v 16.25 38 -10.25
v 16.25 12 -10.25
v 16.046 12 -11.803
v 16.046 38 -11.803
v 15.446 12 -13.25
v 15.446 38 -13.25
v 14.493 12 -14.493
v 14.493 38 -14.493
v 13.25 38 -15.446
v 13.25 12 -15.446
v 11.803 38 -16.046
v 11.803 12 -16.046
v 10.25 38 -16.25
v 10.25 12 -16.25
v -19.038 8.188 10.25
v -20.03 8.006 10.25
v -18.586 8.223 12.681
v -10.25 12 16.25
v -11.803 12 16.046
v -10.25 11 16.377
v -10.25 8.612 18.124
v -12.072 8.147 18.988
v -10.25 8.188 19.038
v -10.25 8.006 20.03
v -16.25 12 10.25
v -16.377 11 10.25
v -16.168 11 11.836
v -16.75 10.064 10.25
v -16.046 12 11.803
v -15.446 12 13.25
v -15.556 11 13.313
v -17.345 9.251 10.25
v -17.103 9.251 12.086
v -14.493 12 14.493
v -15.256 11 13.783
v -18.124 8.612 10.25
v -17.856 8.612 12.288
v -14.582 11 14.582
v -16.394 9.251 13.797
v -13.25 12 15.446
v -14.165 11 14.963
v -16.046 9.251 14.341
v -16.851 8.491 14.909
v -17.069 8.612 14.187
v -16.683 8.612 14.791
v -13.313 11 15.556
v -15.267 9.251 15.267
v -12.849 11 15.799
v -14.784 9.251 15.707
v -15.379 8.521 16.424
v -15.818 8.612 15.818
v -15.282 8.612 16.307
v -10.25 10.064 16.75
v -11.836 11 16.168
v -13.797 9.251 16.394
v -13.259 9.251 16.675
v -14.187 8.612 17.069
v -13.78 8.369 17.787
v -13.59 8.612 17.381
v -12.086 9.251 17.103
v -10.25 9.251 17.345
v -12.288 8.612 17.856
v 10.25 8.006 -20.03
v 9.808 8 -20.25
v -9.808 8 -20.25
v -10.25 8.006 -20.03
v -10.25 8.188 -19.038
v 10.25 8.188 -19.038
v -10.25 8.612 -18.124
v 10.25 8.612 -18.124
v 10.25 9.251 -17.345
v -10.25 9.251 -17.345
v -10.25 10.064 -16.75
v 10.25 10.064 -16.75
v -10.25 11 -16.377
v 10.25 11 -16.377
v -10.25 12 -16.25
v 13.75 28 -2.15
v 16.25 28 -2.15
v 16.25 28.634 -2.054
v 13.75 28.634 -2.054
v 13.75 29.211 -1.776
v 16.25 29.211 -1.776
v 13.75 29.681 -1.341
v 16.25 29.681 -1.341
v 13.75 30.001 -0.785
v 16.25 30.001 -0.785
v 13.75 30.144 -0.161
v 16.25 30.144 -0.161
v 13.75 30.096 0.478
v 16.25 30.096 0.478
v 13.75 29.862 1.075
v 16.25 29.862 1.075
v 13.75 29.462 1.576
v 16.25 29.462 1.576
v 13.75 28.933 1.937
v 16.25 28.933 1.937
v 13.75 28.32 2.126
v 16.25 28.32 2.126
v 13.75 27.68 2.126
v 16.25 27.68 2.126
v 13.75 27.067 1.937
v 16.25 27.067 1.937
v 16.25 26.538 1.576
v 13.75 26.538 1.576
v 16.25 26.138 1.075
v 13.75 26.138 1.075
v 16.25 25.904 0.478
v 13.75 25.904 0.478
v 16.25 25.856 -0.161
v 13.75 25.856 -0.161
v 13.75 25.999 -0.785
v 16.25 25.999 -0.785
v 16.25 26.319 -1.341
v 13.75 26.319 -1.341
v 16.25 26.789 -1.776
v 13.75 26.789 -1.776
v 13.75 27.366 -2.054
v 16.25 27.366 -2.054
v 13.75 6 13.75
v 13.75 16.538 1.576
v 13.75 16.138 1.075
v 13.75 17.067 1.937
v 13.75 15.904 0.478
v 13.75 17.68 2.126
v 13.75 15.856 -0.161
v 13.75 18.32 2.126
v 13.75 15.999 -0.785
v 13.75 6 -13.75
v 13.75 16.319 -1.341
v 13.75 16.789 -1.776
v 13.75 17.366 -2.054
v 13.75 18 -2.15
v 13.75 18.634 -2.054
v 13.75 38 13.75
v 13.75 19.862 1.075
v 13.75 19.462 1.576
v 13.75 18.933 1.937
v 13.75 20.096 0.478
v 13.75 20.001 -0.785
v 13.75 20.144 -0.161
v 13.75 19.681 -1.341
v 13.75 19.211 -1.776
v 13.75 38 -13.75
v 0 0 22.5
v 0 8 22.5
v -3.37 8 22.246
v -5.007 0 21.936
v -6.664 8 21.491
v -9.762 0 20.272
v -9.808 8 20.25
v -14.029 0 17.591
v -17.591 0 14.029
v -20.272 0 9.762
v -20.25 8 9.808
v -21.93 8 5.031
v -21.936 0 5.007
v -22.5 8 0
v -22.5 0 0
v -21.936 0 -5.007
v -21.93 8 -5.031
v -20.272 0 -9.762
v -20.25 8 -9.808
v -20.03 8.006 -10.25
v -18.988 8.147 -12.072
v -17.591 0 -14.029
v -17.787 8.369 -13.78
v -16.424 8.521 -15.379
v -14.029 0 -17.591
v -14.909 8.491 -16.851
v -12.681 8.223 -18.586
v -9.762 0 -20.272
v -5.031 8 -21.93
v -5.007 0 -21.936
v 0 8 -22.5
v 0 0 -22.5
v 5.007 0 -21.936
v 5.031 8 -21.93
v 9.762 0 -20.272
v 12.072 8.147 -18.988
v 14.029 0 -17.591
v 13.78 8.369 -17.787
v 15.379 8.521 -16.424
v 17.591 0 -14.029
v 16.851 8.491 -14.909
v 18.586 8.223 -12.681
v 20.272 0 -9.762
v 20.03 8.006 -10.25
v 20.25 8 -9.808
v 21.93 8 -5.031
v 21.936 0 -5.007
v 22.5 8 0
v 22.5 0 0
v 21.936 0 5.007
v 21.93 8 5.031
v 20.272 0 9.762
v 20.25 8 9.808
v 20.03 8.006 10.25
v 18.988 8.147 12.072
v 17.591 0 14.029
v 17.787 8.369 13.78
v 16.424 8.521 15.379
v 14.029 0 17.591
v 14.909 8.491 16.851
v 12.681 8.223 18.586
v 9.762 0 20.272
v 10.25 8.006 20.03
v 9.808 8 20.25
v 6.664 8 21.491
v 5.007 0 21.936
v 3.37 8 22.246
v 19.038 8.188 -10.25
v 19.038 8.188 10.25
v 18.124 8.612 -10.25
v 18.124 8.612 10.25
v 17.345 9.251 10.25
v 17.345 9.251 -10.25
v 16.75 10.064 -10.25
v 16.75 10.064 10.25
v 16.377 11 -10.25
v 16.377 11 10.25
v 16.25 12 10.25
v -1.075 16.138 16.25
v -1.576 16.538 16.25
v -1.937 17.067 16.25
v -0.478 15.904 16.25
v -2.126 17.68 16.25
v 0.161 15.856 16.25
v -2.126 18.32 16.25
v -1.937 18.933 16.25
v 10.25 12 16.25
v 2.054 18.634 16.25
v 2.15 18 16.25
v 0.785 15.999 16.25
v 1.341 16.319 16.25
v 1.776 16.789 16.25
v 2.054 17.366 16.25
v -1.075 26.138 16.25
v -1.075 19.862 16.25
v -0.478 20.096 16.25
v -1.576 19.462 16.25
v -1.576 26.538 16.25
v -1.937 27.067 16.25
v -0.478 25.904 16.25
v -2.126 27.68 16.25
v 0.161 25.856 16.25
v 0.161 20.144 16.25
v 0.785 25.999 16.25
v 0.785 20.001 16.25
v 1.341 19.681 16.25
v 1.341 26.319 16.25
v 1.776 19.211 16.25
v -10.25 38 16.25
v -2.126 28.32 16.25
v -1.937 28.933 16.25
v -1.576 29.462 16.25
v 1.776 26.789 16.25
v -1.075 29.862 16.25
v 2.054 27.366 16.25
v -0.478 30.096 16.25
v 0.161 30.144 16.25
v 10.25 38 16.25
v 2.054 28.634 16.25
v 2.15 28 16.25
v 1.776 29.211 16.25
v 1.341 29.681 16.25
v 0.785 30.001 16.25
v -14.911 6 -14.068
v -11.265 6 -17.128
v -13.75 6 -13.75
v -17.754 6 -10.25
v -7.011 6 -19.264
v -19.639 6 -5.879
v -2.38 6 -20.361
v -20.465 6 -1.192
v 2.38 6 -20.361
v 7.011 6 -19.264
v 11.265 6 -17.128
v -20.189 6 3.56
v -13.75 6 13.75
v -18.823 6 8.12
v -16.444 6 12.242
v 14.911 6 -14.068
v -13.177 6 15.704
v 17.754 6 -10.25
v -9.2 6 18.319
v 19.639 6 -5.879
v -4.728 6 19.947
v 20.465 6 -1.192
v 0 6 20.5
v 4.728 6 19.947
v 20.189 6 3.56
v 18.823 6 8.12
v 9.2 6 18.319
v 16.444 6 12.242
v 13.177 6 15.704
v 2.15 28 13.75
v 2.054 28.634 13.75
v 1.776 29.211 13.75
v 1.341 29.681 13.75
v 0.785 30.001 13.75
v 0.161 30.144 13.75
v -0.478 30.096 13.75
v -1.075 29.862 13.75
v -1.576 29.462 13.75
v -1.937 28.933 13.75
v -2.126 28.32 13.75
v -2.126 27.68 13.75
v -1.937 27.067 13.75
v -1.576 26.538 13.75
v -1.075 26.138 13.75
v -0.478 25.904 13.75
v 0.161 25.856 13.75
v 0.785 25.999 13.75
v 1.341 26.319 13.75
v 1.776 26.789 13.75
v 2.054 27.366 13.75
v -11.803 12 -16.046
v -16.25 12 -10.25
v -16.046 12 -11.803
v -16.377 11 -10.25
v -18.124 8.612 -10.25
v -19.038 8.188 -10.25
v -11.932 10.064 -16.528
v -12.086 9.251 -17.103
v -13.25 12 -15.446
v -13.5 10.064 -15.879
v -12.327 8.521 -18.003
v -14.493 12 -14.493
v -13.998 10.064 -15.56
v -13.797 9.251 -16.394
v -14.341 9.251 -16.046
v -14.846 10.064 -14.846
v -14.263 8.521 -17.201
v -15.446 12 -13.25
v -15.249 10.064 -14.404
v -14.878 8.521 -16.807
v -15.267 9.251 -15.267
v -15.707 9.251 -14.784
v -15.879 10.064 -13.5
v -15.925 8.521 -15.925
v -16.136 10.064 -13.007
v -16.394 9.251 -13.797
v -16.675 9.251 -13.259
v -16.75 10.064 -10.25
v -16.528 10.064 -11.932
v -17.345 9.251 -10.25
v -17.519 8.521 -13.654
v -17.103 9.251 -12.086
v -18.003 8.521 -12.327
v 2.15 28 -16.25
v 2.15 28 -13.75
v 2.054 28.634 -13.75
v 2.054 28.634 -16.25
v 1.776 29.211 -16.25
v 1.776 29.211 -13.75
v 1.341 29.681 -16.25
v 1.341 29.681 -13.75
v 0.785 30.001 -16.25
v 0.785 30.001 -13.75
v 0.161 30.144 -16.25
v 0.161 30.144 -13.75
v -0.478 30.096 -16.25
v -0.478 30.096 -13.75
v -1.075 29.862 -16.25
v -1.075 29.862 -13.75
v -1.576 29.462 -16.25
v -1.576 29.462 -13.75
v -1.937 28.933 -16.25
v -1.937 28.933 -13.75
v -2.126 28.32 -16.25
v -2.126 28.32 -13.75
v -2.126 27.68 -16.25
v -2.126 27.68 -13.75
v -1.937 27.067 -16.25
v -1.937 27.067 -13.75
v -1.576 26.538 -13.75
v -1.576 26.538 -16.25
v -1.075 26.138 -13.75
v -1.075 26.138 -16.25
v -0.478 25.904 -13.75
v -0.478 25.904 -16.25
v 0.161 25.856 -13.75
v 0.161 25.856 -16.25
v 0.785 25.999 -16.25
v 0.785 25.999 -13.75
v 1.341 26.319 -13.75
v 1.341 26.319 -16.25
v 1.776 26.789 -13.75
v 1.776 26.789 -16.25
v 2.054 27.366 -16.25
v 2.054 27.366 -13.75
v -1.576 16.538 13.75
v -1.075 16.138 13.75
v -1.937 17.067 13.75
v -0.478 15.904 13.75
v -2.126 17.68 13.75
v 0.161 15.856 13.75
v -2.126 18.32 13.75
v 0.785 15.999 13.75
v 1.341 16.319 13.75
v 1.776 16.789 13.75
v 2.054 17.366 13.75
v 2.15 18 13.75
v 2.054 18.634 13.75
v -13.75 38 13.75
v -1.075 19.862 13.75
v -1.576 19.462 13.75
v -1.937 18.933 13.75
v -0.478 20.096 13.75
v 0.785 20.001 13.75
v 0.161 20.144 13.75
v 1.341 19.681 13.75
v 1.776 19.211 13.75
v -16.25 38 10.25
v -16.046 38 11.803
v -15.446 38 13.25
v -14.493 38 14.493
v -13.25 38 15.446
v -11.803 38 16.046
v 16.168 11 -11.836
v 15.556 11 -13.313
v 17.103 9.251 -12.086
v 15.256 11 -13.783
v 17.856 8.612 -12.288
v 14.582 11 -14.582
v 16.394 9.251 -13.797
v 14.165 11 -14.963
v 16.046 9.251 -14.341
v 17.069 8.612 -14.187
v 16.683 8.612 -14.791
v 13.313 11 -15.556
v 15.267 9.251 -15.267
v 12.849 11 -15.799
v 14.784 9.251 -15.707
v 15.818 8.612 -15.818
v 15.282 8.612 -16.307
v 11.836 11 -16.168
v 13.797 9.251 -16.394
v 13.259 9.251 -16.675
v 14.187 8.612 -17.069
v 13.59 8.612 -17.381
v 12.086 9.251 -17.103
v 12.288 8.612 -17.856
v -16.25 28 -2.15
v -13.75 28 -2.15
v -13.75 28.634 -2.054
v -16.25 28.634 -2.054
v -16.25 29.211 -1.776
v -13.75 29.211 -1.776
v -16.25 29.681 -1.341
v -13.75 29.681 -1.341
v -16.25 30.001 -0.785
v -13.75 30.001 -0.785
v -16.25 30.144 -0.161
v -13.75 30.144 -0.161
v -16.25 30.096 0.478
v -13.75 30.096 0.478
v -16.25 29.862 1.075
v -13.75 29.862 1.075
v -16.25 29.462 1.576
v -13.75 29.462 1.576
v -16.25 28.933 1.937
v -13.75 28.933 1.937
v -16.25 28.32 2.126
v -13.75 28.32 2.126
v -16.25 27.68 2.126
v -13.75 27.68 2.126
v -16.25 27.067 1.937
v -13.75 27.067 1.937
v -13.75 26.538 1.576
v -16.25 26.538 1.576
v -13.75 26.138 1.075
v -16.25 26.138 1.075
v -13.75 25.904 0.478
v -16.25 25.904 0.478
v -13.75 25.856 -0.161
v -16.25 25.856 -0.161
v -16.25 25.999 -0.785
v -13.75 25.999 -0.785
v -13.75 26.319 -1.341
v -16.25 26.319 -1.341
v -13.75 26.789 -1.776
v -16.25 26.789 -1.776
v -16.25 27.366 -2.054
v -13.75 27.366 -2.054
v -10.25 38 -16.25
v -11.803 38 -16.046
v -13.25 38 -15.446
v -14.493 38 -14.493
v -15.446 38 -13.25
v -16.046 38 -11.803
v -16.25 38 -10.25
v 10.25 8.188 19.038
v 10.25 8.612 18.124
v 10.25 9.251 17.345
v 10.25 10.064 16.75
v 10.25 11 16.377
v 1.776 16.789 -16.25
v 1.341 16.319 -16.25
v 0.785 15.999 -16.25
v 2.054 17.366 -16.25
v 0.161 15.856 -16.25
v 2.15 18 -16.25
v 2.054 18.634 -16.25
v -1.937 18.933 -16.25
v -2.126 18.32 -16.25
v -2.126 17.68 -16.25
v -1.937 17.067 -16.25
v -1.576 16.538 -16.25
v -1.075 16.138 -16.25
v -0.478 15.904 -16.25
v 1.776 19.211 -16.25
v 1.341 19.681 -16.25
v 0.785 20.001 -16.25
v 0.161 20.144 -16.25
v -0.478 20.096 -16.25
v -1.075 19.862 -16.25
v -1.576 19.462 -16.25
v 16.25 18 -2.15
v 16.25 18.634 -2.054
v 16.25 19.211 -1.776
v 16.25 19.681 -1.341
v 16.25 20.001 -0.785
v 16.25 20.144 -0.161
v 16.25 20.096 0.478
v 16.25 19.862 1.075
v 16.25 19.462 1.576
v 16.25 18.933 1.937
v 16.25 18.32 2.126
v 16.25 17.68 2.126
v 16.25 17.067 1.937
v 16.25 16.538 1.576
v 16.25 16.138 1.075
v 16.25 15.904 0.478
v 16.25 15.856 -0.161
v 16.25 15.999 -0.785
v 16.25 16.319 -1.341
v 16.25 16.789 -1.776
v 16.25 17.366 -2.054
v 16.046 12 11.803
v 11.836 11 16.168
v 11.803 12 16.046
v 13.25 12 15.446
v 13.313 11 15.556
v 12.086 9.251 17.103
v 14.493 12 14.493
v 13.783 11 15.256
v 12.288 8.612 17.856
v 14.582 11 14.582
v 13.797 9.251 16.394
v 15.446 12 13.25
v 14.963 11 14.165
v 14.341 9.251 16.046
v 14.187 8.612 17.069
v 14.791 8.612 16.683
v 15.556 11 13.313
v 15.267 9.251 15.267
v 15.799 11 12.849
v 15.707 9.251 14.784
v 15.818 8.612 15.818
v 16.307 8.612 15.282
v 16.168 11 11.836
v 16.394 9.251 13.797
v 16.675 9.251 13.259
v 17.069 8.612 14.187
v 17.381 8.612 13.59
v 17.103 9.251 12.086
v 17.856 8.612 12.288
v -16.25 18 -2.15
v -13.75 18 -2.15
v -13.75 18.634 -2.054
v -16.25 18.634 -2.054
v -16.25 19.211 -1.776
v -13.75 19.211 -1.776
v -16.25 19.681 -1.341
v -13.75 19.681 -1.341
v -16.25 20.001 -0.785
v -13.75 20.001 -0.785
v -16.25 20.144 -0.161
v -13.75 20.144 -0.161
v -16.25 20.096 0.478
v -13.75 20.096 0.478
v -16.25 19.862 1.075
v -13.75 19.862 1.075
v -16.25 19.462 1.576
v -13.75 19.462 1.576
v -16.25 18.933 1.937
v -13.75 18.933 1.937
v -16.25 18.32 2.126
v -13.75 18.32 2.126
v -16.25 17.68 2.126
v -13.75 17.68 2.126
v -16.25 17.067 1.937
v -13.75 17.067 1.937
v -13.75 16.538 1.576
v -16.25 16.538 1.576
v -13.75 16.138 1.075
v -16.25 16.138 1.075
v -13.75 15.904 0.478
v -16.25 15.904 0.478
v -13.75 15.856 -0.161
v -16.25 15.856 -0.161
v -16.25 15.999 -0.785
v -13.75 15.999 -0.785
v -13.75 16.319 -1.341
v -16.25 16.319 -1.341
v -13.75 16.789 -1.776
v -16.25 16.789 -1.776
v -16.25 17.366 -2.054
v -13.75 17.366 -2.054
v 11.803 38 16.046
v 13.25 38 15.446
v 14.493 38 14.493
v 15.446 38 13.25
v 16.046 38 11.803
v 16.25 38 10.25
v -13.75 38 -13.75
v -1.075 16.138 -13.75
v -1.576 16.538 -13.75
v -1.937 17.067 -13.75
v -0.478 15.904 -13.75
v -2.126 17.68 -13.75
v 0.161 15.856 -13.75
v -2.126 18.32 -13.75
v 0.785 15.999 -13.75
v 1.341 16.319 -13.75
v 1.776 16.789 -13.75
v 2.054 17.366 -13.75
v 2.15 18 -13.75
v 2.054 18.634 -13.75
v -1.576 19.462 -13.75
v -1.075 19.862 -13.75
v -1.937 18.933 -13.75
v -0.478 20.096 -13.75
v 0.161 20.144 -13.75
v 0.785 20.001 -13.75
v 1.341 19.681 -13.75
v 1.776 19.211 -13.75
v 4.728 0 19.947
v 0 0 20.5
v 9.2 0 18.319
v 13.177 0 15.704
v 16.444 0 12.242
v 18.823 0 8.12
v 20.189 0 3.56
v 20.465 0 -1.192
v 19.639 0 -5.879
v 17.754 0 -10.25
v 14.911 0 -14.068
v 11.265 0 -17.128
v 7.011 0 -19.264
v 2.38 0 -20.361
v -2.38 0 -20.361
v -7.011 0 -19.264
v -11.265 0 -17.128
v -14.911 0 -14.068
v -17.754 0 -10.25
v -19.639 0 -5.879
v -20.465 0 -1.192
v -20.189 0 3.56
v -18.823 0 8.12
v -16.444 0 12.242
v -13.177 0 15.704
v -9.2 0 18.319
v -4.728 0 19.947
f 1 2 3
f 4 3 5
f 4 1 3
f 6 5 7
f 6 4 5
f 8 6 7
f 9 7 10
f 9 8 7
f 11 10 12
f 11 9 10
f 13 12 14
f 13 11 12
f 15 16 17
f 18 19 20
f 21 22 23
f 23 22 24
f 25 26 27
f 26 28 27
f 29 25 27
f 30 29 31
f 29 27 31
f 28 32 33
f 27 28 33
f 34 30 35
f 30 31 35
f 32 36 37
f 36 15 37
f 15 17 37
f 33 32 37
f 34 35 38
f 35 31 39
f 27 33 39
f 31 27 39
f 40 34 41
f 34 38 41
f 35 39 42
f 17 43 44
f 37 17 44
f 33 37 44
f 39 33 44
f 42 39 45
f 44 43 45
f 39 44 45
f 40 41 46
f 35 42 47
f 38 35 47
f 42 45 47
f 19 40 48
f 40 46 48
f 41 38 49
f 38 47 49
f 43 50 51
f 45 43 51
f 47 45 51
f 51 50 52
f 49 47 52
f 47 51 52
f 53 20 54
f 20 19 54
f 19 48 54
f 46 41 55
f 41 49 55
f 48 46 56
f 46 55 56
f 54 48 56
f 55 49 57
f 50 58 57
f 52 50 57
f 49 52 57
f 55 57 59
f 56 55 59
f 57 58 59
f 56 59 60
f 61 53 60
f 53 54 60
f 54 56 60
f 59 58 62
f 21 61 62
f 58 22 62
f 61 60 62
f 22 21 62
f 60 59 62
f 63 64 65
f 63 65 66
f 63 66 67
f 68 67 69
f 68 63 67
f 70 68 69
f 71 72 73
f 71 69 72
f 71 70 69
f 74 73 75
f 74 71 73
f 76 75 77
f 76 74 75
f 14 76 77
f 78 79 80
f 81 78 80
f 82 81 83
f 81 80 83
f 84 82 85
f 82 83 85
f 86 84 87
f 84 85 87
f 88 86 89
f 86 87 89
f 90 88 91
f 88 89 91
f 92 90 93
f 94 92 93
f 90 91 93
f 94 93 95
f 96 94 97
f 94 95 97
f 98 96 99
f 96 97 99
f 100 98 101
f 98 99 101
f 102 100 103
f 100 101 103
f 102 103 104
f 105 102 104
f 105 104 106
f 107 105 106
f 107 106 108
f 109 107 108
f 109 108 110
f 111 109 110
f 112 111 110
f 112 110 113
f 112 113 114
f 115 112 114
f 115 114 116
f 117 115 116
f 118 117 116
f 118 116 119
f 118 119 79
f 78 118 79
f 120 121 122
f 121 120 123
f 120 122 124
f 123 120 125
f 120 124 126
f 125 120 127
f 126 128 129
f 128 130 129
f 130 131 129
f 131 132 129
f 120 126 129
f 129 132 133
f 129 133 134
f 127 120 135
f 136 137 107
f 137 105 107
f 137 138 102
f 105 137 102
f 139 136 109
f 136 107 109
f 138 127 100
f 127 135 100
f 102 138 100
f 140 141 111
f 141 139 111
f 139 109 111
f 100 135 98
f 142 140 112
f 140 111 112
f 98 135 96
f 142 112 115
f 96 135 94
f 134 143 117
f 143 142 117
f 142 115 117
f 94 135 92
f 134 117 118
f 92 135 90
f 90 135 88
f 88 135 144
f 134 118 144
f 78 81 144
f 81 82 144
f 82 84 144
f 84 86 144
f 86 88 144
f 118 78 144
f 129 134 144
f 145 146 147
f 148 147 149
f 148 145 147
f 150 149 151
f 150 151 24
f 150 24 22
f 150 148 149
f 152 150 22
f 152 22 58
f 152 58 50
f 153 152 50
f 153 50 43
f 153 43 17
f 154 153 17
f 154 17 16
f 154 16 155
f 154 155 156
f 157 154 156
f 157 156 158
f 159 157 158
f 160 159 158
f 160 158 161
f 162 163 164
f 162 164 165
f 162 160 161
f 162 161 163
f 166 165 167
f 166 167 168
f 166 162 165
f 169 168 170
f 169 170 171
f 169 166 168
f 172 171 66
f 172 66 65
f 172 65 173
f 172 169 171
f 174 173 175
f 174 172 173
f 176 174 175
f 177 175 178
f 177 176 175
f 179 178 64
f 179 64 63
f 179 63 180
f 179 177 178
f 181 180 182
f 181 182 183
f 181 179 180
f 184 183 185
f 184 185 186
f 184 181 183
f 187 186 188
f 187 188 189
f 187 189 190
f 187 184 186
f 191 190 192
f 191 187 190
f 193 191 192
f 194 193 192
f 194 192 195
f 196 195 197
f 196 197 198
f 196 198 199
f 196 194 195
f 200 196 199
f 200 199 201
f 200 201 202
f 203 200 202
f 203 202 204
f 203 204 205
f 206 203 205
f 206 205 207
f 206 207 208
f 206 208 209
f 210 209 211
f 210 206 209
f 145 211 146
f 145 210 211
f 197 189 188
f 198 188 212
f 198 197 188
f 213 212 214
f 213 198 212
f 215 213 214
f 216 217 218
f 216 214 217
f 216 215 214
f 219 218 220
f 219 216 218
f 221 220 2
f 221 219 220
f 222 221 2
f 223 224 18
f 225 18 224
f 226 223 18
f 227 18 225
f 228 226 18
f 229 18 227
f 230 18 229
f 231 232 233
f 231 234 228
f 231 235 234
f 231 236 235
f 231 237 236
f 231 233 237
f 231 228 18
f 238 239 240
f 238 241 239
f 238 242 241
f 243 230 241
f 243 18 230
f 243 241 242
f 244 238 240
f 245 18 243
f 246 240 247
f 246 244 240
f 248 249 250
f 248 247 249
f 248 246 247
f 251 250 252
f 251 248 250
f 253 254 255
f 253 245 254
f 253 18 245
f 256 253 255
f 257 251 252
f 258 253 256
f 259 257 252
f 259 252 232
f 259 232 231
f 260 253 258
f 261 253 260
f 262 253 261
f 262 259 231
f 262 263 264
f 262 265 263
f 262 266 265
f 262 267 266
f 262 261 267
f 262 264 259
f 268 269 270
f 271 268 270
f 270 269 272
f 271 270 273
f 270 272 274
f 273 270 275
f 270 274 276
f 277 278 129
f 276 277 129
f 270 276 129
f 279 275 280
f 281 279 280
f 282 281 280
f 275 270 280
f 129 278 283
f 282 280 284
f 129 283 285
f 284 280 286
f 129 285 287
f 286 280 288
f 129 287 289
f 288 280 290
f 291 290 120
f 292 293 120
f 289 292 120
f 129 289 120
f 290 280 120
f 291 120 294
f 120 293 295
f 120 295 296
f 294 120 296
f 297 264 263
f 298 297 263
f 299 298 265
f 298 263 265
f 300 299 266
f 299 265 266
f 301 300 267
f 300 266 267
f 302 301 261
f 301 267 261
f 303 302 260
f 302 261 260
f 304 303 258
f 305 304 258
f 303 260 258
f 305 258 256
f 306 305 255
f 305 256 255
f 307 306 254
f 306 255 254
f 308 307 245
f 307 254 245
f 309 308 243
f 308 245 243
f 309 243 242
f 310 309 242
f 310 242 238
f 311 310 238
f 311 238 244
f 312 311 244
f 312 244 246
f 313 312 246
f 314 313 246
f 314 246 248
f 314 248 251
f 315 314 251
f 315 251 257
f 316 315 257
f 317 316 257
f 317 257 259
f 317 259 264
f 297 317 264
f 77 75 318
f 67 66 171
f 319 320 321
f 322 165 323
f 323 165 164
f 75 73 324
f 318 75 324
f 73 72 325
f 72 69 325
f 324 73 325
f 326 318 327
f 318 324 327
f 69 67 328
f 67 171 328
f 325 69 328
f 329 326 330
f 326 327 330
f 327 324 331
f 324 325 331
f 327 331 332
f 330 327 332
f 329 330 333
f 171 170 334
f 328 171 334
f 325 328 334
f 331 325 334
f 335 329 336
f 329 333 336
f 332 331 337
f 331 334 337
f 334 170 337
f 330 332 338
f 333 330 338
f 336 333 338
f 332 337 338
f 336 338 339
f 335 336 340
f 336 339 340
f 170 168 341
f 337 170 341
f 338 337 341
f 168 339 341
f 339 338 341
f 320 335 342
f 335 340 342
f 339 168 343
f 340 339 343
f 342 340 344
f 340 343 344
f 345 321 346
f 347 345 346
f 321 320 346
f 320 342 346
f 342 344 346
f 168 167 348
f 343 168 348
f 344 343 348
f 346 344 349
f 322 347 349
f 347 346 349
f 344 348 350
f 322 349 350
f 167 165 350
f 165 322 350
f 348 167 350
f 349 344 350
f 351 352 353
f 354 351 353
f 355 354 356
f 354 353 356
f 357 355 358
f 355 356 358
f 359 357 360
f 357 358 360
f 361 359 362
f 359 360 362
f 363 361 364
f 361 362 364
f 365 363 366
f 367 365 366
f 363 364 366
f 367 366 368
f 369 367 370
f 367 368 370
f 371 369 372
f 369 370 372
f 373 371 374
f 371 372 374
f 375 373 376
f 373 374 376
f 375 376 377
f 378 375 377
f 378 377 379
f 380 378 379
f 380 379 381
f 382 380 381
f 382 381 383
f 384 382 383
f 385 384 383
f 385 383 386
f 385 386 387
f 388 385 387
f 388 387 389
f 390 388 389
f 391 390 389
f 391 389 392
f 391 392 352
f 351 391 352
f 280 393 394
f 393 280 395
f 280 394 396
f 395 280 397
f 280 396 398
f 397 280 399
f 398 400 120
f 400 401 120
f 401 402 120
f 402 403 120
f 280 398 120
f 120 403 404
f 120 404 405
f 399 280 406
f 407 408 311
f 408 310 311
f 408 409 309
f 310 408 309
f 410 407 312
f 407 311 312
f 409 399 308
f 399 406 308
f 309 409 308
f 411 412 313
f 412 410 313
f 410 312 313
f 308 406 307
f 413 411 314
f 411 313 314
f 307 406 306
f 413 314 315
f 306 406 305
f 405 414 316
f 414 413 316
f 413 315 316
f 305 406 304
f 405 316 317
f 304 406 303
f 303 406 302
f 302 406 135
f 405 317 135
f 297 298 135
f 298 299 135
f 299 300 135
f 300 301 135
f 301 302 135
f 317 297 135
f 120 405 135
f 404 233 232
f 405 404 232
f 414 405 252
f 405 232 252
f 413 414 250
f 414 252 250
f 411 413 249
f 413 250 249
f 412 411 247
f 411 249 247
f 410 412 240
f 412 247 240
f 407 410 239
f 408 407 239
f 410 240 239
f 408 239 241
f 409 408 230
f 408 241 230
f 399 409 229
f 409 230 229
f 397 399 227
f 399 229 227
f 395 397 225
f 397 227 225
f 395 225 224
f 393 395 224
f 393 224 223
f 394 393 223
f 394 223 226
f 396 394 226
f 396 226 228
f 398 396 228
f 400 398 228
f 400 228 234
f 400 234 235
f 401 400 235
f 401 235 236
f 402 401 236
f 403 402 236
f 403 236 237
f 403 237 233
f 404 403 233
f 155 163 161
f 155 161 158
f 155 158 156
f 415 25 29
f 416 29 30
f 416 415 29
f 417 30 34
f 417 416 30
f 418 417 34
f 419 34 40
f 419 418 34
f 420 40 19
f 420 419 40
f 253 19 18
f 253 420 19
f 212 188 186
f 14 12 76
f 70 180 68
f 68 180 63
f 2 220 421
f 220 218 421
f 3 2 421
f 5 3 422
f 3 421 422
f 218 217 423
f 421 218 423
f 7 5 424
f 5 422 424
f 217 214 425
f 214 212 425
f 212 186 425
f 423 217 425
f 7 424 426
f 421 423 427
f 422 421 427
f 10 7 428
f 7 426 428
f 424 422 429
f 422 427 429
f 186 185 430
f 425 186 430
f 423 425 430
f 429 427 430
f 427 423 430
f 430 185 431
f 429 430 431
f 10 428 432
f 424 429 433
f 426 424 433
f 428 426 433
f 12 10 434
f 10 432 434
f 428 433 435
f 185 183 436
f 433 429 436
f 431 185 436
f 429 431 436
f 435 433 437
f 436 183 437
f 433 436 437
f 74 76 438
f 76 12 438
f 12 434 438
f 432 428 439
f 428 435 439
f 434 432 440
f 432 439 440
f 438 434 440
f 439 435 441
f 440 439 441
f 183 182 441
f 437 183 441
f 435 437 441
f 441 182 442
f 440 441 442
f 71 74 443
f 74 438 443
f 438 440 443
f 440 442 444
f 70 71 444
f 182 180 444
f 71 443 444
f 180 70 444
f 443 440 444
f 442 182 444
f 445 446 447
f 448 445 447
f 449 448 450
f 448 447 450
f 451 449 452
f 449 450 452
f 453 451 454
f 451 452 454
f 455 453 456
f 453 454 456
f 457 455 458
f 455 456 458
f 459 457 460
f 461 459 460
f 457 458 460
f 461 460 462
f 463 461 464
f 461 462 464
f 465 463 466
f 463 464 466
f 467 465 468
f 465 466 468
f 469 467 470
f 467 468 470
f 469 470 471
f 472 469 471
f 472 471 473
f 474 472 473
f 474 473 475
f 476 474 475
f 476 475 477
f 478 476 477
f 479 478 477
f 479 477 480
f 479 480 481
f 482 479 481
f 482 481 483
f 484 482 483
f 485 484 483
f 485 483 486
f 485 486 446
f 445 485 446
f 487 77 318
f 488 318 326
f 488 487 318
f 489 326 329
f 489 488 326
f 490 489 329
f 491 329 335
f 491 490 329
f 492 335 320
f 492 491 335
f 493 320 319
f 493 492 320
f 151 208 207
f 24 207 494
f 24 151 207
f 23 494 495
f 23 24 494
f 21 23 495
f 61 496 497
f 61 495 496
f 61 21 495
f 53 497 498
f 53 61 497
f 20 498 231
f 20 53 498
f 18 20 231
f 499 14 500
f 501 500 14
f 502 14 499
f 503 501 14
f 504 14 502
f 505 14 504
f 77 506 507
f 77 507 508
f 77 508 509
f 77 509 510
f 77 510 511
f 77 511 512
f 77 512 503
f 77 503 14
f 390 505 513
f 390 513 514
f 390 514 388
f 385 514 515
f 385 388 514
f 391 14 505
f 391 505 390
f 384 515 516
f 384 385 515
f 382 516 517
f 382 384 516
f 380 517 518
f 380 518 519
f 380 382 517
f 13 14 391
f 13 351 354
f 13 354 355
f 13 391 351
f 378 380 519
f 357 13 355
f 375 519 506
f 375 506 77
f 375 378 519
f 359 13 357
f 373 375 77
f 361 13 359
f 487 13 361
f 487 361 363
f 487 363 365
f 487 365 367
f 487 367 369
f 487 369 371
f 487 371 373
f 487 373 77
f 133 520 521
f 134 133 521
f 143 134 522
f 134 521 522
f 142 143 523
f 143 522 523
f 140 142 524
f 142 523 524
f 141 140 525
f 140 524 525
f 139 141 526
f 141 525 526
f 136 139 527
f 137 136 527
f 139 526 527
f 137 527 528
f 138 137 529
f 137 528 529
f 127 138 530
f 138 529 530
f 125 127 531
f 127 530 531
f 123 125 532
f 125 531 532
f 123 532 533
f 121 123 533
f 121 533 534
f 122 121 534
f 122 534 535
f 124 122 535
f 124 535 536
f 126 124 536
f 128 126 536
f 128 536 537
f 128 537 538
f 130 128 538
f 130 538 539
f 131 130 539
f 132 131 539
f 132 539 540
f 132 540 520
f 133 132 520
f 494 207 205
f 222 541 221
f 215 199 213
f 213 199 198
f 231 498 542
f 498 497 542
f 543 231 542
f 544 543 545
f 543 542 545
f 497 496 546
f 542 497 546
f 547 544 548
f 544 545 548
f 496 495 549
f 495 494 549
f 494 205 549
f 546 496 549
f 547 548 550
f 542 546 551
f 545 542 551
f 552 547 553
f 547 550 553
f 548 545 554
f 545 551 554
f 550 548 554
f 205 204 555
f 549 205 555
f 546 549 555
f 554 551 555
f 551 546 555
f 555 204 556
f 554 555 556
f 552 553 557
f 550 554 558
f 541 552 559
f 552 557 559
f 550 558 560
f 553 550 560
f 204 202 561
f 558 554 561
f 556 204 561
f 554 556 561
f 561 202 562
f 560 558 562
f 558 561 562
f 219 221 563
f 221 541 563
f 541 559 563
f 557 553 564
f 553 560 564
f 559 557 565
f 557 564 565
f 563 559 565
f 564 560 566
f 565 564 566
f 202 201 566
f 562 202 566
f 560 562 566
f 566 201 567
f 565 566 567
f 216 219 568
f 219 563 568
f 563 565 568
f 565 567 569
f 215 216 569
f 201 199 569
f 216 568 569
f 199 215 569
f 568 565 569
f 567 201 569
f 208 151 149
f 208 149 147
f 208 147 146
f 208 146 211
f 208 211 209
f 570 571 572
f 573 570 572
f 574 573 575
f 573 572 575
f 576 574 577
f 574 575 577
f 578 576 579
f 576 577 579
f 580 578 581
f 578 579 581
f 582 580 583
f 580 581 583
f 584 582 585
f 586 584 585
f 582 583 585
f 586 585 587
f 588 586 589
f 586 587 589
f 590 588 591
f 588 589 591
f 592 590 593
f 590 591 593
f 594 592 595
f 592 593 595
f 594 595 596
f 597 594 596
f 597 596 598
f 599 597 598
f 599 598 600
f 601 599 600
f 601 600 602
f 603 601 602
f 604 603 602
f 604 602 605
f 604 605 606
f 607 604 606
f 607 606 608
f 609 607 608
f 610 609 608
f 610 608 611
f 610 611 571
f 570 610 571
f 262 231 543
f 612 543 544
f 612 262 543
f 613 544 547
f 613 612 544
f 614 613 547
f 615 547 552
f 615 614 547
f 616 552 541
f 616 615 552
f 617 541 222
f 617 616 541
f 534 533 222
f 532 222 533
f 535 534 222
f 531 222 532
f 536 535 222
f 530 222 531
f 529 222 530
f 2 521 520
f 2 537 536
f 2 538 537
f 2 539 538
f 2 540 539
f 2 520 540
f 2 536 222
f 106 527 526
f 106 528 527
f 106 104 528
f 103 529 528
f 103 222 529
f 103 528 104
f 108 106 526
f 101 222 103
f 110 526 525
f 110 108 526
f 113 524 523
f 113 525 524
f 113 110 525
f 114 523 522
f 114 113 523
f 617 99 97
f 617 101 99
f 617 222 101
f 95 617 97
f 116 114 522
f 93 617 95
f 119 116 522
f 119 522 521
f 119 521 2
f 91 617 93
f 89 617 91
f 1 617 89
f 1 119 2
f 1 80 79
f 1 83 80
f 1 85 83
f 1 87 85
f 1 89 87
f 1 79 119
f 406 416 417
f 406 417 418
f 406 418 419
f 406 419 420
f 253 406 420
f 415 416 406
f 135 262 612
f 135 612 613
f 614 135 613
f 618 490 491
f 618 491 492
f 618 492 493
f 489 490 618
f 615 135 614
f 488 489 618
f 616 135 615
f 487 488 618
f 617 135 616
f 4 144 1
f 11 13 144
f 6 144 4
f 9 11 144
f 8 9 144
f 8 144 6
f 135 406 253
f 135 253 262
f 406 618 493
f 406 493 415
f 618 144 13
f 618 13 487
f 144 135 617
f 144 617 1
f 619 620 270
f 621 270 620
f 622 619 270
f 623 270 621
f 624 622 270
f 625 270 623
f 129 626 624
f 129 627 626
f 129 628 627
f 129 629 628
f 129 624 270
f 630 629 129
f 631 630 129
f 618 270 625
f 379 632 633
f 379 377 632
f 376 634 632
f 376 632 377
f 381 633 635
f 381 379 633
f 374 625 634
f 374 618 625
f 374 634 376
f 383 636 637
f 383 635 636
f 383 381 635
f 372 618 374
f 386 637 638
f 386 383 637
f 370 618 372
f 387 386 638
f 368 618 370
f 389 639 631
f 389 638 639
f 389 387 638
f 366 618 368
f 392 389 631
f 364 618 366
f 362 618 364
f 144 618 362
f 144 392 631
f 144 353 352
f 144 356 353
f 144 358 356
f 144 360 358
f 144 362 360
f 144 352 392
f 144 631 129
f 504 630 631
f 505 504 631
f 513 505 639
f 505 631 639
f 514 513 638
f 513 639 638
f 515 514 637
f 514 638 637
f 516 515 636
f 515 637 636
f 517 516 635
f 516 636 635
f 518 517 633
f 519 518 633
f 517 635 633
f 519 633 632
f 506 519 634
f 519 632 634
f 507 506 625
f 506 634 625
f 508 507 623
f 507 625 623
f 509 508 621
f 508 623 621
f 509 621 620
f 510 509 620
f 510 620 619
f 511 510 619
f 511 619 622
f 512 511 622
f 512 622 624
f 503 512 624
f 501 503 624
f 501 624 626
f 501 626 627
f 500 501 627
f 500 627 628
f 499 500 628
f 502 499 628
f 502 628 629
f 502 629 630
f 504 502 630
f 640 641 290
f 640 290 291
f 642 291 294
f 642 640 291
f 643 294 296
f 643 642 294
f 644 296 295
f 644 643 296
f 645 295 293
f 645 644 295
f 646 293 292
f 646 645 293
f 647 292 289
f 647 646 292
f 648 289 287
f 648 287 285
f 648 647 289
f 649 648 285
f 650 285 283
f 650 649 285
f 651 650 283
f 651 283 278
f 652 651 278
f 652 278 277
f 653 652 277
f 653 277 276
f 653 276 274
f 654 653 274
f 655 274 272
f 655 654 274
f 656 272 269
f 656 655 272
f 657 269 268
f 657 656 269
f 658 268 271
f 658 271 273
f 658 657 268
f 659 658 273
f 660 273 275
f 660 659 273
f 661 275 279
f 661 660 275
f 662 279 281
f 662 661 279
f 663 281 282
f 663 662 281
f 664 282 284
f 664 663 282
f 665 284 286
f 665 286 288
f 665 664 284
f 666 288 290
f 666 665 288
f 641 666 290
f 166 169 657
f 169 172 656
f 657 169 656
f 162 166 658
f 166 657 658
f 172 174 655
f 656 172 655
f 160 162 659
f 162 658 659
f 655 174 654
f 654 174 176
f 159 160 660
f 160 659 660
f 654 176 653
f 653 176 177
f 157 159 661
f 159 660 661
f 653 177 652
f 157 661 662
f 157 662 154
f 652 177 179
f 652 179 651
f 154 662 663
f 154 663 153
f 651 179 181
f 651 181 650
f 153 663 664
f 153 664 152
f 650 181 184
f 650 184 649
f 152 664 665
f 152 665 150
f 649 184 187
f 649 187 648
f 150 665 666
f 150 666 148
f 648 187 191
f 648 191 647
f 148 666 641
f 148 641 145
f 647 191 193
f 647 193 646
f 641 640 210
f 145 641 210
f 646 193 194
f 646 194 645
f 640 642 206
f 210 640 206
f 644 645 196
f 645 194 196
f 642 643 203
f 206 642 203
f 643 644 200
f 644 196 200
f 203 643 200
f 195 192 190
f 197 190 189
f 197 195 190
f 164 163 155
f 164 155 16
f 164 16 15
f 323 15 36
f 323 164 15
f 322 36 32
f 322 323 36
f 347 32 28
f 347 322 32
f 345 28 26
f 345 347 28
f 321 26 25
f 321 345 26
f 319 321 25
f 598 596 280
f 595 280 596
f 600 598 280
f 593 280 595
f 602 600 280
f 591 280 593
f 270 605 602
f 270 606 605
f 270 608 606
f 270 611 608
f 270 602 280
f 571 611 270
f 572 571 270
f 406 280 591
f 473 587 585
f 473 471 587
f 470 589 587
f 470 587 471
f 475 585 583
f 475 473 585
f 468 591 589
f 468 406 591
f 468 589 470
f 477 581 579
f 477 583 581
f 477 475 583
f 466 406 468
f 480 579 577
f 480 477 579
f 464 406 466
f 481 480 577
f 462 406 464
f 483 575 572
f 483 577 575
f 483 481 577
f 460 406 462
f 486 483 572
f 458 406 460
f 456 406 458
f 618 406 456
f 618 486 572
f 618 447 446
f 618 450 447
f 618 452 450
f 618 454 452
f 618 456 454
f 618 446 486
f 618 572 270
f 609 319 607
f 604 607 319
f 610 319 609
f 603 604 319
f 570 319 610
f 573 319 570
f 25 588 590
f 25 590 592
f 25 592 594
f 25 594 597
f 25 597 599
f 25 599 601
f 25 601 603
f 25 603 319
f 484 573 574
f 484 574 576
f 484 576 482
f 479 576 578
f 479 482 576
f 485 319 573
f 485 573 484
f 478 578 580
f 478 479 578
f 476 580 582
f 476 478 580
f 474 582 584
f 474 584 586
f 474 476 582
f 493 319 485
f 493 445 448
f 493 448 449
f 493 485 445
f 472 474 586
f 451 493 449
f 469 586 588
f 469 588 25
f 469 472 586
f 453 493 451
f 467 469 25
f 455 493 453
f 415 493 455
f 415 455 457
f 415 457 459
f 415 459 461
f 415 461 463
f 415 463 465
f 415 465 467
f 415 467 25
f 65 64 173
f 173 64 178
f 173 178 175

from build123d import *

# Parameters (mm, degrees)
SKETCH_1_R          = 22.5
SKETCH_1_R_2        = 20.5
EXTRUDE_1_DEPTH     = 6
SKETCH_2_R          = 22.5
EXTRUDE_2_DEPTH     = 2
SKETCH_3_W          = 26.5
SKETCH_3_H          = 26.5
SKETCH_3_W_2        = 20.5
SKETCH_3_H_2        = 20.5
EXTRUDE_3_DEPTH     = 30
SKETCH_4_R          = 2.15
CUT_EXTRUDE_1_DEPTH = 30
SKETCH_5_R          = 2.15
CUT_EXTRUDE_2_DEPTH = 30
FILLET_1_R          = 3
SKETCH_7_W          = 26.5
SKETCH_7_H          = 26.5
EXTRUDE_4_DEPTH     = 30
SKETCH_8_W          = 27.5
SKETCH_8_H          = 27.5
CUT_EXTRUDE_4_DEPTH = 50.563091106
FILLET_2_R          = 4
SKETCH_9_R          = 2.15
CUT_EXTRUDE_5_DEPTH = 59.752127725
SKETCH_10_R         = 2.15
CUT_EXTRUDE_6_DEPTH = 59.752127725


with BuildPart() as part:
    # 草图1 → 凸台-拉伸1 (new body)
    with BuildSketch(Plane(origin=(0, 0, 0), x_dir=(1, 0, 0), z_dir=(0, 1, 0))):
        with Locations(Location((0, 0, 0), (0, 0, 270))):
            Circle(SKETCH_1_R)
        with Locations(Location((0, 0, 0), (0, 0, 270))):
            Circle(SKETCH_1_R_2, mode=Mode.SUBTRACT)
    extrude(amount=EXTRUDE_1_DEPTH)

    # 草图2 → 凸台-拉伸2 (add)
    with BuildSketch(Plane(origin=(0, 6, 0), x_dir=(1, 0, 0), z_dir=(0, 1, 0))):
        with Locations(Location((0, 0, 0), (0, 0, 270))):
            Circle(SKETCH_2_R)
    extrude(amount=EXTRUDE_2_DEPTH)

    # 草图3 → 凸台-拉伸3 (add)
    with BuildSketch(Plane(origin=(0, 8, 0), x_dir=(1, 0, 0), z_dir=(0, 1, 0))):
        Rectangle(SKETCH_3_W, SKETCH_3_H)
        Rectangle(SKETCH_3_W_2, SKETCH_3_H_2, mode=Mode.SUBTRACT)
    extrude(amount=EXTRUDE_3_DEPTH)

    # 草图4 → 切除-拉伸1 (cut)
    with BuildSketch(Plane.XY.offset(13.25)):
        with Locations((0, 28)):
            Circle(SKETCH_4_R)
        with Locations((0, 18)):
            Circle(SKETCH_4_R)
    extrude(amount=-CUT_EXTRUDE_1_DEPTH, mode=Mode.SUBTRACT)

    # 草图5 → 切除-拉伸2 (cut)
    with BuildSketch(Plane(origin=(13.25, 0, 0), x_dir=(0, 0, -1), z_dir=(1, 0, 0))):
        with Locations((0, 28)):
            Circle(SKETCH_5_R)
        with Locations((0, 18)):
            Circle(SKETCH_5_R)
    extrude(amount=-CUT_EXTRUDE_2_DEPTH, mode=Mode.SUBTRACT)

    # 圆角1
    fillet_1_edges = [part.edges().sort_by_distance(p)[0] for p in [
        (-13.25, 23, -13.25),
        (-13.25, 23, 13.25),
        (13.25, 23, 13.25),
        (13.25, 23, -13.25),
    ]]
    fillet(fillet_1_edges, radius=FILLET_1_R)

    # 草图7 → 凸台-拉伸4 (add)
    with BuildSketch(Plane(origin=(0, 38, 0), x_dir=(1, 0, 0), z_dir=(0, 1, 0))):
        with BuildLine():
            Line((-16.25, 10.25), (-16.25, -10.25))
            ThreePointArc((-16.25, -10.25), (-14.492640687, -14.492640687), (-10.25, -16.25))
            Line((-10.25, -16.25), (10.25, -16.25))
            ThreePointArc((10.25, -16.25), (14.492640687, -14.492640687), (16.25, -10.25))
            Line((16.25, -10.25), (16.25, 10.25))
            ThreePointArc((16.25, 10.25), (14.492640687, 14.492640687), (10.25, 16.25))
            Line((10.25, 16.25), (-10.25, 16.25))
            ThreePointArc((-10.25, 16.25), (-14.492640687, 14.492640687), (-16.25, 10.25))
        make_face()
        Rectangle(SKETCH_7_W, SKETCH_7_H, mode=Mode.SUBTRACT)
    extrude(amount=-EXTRUDE_4_DEPTH)

    # 草图8 → 切除-拉伸4 (cut, through all)
    with BuildSketch(Plane(origin=(0, 38, 0), x_dir=(1, 0, 0), z_dir=(0, 1, 0))):
        Rectangle(SKETCH_8_W, SKETCH_8_H)
    extrude(amount=-CUT_EXTRUDE_4_DEPTH, mode=Mode.SUBTRACT)

    # 圆角2
    # the kernel refuses this fillet: 4 mm, written as the material it adds along each edge
    with BuildSketch(Plane(origin=(-10.25, 8, -10.25), x_dir=(0, 0, -1), z_dir=(1, 0, 0))) as fillet_2_piece_1_section:
        with BuildLine():
            CenterArc((6 + FILLET_2_R, FILLET_2_R), FILLET_2_R, 180, 90)
            Line((6, FILLET_2_R), (6, 0))
            Line((6, 0), (6 + FILLET_2_R, 0))
        make_face()
    fillet_2_piece_1 = revolve(axis=Axis((-10.25, 8, -10.25), (0, 1, 0)), revolution_arc=90, mode=Mode.PRIVATE)
    fillet_2_piece_1 = fillet_2_piece_1 & Plane(origin=(0, 8.919609383, 0), x_dir=(0, 0, 1), z_dir=(0, -1, 0)) * Cylinder(22.5, 40, mode=Mode.PRIVATE)
    add(fillet_2_piece_1)
    with BuildSketch(Plane(origin=(10.25, 8, -16.25), x_dir=(0, 0, -1), z_dir=(-1, 0, 0))) as fillet_2_piece_2_section:
        with BuildLine():
            CenterArc((FILLET_2_R, -FILLET_2_R), FILLET_2_R, 90, 90)
            Line((0, -FILLET_2_R), (0, 0))
            Line((0, 0), (FILLET_2_R, 0))
        make_face()
    fillet_2_piece_2 = extrude(amount=20.5, mode=Mode.PRIVATE)
    fillet_2_piece_2 = fillet_2_piece_2 & Plane(origin=(0, 8.90566888, 0), x_dir=(0, 0, 1), z_dir=(0, -1, 0)) * Cylinder(22.5, 57, mode=Mode.PRIVATE)
    add(fillet_2_piece_2)
    with BuildSketch(Plane(origin=(10.25, 8, -10.25), x_dir=(1, 0, 0), z_dir=(0, 0, 1))) as fillet_2_piece_3_section:
        with BuildLine():
            CenterArc((6 + FILLET_2_R, FILLET_2_R), FILLET_2_R, 180, 90)
            Line((6, FILLET_2_R), (6, 0))
            Line((6, 0), (6 + FILLET_2_R, 0))
        make_face()
    fillet_2_piece_3 = revolve(axis=Axis((10.25, 8, -10.25), (0, 1, 0)), revolution_arc=90, mode=Mode.PRIVATE)
    fillet_2_piece_3 = fillet_2_piece_3 & Plane(origin=(0, 8.919609383, 0), x_dir=(0, 0, 1), z_dir=(0, -1, 0)) * Cylinder(22.5, 40, mode=Mode.PRIVATE)
    add(fillet_2_piece_3)
    with BuildSketch(Plane(origin=(16.25, 8, 10.25), x_dir=(1, 0, 0), z_dir=(0, 0, -1))) as fillet_2_piece_4_section:
        with BuildLine():
            CenterArc((FILLET_2_R, -FILLET_2_R), FILLET_2_R, 90, 90)
            Line((0, -FILLET_2_R), (0, 0))
            Line((0, 0), (FILLET_2_R, 0))
        make_face()
    fillet_2_piece_4 = extrude(amount=20.5, mode=Mode.PRIVATE)
    fillet_2_piece_4 = fillet_2_piece_4 & Plane(origin=(0, 8.90566888, 0), x_dir=(0, 0, 1), z_dir=(0, -1, 0)) * Cylinder(22.5, 57, mode=Mode.PRIVATE)
    add(fillet_2_piece_4)
    with BuildSketch(Plane(origin=(10.25, 8, 10.25), x_dir=(0, 0, 1), z_dir=(-1, 0, 0))) as fillet_2_piece_5_section:
        with BuildLine():
            CenterArc((6 + FILLET_2_R, FILLET_2_R), FILLET_2_R, 180, 90)
            Line((6, FILLET_2_R), (6, 0))
            Line((6, 0), (6 + FILLET_2_R, 0))
        make_face()
    fillet_2_piece_5 = revolve(axis=Axis((10.25, 8, 10.25), (0, 1, 0)), revolution_arc=90, mode=Mode.PRIVATE)
    fillet_2_piece_5 = fillet_2_piece_5 & Plane(origin=(0, 8.919609383, 0), x_dir=(0, 0, 1), z_dir=(0, -1, 0)) * Cylinder(22.5, 40, mode=Mode.PRIVATE)
    add(fillet_2_piece_5)
    with BuildSketch(Plane(origin=(-10.25, 8, 16.25), x_dir=(0, 0, 1), z_dir=(1, 0, 0))) as fillet_2_piece_6_section:
        with BuildLine():
            CenterArc((FILLET_2_R, -FILLET_2_R), FILLET_2_R, 90, 90)
            Line((0, -FILLET_2_R), (0, 0))
            Line((0, 0), (FILLET_2_R, 0))
        make_face()
    fillet_2_piece_6 = extrude(amount=20.5, mode=Mode.PRIVATE)
    fillet_2_piece_6 = fillet_2_piece_6 & Plane(origin=(0, 8.90566888, 0), x_dir=(0, 0, 1), z_dir=(0, -1, 0)) * Cylinder(22.5, 57, mode=Mode.PRIVATE)
    add(fillet_2_piece_6)
    with BuildSketch(Plane(origin=(-10.25, 8, 10.25), x_dir=(-1, 0, 0), z_dir=(0, 0, -1))) as fillet_2_piece_7_section:
        with BuildLine():
            CenterArc((6 + FILLET_2_R, FILLET_2_R), FILLET_2_R, 180, 90)
            Line((6, FILLET_2_R), (6, 0))
            Line((6, 0), (6 + FILLET_2_R, 0))
        make_face()
    fillet_2_piece_7 = revolve(axis=Axis((-10.25, 8, 10.25), (0, 1, 0)), revolution_arc=90, mode=Mode.PRIVATE)
    fillet_2_piece_7 = fillet_2_piece_7 & Plane(origin=(0, 8.919609383, 0), x_dir=(0, 0, 1), z_dir=(0, -1, 0)) * Cylinder(22.5, 40, mode=Mode.PRIVATE)
    add(fillet_2_piece_7)
    with BuildSketch(Plane(origin=(-16.25, 8, -10.25), x_dir=(-1, 0, 0), z_dir=(0, 0, 1))) as fillet_2_piece_8_section:
        with BuildLine():
            CenterArc((FILLET_2_R, -FILLET_2_R), FILLET_2_R, 90, 90)
            Line((0, -FILLET_2_R), (0, 0))
            Line((0, 0), (FILLET_2_R, 0))
        make_face()
    fillet_2_piece_8 = extrude(amount=20.5, mode=Mode.PRIVATE)
    fillet_2_piece_8 = fillet_2_piece_8 & Plane(origin=(0, 8.90566888, 0), x_dir=(0, 0, 1), z_dir=(0, -1, 0)) * Cylinder(22.5, 57, mode=Mode.PRIVATE)
    add(fillet_2_piece_8)

    # 草图9 → 切除-拉伸5 (cut, through all)
    with BuildSketch(Plane(origin=(16.25, 0, 0), x_dir=(0, 0, -1), z_dir=(1, 0, 0))):
        with Locations((0, 28)):
            Circle(SKETCH_9_R)
        with Locations((0, 18)):
            Circle(SKETCH_9_R)
    extrude(amount=-CUT_EXTRUDE_5_DEPTH, mode=Mode.SUBTRACT)

    # 草图10 → 切除-拉伸6 (cut, through all)
    with BuildSketch(Plane.XY.offset(16.25)):
        with Locations((0, 28)):
            Circle(SKETCH_10_R)
        with Locations((0, 18)):
            Circle(SKETCH_10_R)
    extrude(amount=-CUT_EXTRUDE_6_DEPTH, mode=Mode.SUBTRACT)


solid = part.part
